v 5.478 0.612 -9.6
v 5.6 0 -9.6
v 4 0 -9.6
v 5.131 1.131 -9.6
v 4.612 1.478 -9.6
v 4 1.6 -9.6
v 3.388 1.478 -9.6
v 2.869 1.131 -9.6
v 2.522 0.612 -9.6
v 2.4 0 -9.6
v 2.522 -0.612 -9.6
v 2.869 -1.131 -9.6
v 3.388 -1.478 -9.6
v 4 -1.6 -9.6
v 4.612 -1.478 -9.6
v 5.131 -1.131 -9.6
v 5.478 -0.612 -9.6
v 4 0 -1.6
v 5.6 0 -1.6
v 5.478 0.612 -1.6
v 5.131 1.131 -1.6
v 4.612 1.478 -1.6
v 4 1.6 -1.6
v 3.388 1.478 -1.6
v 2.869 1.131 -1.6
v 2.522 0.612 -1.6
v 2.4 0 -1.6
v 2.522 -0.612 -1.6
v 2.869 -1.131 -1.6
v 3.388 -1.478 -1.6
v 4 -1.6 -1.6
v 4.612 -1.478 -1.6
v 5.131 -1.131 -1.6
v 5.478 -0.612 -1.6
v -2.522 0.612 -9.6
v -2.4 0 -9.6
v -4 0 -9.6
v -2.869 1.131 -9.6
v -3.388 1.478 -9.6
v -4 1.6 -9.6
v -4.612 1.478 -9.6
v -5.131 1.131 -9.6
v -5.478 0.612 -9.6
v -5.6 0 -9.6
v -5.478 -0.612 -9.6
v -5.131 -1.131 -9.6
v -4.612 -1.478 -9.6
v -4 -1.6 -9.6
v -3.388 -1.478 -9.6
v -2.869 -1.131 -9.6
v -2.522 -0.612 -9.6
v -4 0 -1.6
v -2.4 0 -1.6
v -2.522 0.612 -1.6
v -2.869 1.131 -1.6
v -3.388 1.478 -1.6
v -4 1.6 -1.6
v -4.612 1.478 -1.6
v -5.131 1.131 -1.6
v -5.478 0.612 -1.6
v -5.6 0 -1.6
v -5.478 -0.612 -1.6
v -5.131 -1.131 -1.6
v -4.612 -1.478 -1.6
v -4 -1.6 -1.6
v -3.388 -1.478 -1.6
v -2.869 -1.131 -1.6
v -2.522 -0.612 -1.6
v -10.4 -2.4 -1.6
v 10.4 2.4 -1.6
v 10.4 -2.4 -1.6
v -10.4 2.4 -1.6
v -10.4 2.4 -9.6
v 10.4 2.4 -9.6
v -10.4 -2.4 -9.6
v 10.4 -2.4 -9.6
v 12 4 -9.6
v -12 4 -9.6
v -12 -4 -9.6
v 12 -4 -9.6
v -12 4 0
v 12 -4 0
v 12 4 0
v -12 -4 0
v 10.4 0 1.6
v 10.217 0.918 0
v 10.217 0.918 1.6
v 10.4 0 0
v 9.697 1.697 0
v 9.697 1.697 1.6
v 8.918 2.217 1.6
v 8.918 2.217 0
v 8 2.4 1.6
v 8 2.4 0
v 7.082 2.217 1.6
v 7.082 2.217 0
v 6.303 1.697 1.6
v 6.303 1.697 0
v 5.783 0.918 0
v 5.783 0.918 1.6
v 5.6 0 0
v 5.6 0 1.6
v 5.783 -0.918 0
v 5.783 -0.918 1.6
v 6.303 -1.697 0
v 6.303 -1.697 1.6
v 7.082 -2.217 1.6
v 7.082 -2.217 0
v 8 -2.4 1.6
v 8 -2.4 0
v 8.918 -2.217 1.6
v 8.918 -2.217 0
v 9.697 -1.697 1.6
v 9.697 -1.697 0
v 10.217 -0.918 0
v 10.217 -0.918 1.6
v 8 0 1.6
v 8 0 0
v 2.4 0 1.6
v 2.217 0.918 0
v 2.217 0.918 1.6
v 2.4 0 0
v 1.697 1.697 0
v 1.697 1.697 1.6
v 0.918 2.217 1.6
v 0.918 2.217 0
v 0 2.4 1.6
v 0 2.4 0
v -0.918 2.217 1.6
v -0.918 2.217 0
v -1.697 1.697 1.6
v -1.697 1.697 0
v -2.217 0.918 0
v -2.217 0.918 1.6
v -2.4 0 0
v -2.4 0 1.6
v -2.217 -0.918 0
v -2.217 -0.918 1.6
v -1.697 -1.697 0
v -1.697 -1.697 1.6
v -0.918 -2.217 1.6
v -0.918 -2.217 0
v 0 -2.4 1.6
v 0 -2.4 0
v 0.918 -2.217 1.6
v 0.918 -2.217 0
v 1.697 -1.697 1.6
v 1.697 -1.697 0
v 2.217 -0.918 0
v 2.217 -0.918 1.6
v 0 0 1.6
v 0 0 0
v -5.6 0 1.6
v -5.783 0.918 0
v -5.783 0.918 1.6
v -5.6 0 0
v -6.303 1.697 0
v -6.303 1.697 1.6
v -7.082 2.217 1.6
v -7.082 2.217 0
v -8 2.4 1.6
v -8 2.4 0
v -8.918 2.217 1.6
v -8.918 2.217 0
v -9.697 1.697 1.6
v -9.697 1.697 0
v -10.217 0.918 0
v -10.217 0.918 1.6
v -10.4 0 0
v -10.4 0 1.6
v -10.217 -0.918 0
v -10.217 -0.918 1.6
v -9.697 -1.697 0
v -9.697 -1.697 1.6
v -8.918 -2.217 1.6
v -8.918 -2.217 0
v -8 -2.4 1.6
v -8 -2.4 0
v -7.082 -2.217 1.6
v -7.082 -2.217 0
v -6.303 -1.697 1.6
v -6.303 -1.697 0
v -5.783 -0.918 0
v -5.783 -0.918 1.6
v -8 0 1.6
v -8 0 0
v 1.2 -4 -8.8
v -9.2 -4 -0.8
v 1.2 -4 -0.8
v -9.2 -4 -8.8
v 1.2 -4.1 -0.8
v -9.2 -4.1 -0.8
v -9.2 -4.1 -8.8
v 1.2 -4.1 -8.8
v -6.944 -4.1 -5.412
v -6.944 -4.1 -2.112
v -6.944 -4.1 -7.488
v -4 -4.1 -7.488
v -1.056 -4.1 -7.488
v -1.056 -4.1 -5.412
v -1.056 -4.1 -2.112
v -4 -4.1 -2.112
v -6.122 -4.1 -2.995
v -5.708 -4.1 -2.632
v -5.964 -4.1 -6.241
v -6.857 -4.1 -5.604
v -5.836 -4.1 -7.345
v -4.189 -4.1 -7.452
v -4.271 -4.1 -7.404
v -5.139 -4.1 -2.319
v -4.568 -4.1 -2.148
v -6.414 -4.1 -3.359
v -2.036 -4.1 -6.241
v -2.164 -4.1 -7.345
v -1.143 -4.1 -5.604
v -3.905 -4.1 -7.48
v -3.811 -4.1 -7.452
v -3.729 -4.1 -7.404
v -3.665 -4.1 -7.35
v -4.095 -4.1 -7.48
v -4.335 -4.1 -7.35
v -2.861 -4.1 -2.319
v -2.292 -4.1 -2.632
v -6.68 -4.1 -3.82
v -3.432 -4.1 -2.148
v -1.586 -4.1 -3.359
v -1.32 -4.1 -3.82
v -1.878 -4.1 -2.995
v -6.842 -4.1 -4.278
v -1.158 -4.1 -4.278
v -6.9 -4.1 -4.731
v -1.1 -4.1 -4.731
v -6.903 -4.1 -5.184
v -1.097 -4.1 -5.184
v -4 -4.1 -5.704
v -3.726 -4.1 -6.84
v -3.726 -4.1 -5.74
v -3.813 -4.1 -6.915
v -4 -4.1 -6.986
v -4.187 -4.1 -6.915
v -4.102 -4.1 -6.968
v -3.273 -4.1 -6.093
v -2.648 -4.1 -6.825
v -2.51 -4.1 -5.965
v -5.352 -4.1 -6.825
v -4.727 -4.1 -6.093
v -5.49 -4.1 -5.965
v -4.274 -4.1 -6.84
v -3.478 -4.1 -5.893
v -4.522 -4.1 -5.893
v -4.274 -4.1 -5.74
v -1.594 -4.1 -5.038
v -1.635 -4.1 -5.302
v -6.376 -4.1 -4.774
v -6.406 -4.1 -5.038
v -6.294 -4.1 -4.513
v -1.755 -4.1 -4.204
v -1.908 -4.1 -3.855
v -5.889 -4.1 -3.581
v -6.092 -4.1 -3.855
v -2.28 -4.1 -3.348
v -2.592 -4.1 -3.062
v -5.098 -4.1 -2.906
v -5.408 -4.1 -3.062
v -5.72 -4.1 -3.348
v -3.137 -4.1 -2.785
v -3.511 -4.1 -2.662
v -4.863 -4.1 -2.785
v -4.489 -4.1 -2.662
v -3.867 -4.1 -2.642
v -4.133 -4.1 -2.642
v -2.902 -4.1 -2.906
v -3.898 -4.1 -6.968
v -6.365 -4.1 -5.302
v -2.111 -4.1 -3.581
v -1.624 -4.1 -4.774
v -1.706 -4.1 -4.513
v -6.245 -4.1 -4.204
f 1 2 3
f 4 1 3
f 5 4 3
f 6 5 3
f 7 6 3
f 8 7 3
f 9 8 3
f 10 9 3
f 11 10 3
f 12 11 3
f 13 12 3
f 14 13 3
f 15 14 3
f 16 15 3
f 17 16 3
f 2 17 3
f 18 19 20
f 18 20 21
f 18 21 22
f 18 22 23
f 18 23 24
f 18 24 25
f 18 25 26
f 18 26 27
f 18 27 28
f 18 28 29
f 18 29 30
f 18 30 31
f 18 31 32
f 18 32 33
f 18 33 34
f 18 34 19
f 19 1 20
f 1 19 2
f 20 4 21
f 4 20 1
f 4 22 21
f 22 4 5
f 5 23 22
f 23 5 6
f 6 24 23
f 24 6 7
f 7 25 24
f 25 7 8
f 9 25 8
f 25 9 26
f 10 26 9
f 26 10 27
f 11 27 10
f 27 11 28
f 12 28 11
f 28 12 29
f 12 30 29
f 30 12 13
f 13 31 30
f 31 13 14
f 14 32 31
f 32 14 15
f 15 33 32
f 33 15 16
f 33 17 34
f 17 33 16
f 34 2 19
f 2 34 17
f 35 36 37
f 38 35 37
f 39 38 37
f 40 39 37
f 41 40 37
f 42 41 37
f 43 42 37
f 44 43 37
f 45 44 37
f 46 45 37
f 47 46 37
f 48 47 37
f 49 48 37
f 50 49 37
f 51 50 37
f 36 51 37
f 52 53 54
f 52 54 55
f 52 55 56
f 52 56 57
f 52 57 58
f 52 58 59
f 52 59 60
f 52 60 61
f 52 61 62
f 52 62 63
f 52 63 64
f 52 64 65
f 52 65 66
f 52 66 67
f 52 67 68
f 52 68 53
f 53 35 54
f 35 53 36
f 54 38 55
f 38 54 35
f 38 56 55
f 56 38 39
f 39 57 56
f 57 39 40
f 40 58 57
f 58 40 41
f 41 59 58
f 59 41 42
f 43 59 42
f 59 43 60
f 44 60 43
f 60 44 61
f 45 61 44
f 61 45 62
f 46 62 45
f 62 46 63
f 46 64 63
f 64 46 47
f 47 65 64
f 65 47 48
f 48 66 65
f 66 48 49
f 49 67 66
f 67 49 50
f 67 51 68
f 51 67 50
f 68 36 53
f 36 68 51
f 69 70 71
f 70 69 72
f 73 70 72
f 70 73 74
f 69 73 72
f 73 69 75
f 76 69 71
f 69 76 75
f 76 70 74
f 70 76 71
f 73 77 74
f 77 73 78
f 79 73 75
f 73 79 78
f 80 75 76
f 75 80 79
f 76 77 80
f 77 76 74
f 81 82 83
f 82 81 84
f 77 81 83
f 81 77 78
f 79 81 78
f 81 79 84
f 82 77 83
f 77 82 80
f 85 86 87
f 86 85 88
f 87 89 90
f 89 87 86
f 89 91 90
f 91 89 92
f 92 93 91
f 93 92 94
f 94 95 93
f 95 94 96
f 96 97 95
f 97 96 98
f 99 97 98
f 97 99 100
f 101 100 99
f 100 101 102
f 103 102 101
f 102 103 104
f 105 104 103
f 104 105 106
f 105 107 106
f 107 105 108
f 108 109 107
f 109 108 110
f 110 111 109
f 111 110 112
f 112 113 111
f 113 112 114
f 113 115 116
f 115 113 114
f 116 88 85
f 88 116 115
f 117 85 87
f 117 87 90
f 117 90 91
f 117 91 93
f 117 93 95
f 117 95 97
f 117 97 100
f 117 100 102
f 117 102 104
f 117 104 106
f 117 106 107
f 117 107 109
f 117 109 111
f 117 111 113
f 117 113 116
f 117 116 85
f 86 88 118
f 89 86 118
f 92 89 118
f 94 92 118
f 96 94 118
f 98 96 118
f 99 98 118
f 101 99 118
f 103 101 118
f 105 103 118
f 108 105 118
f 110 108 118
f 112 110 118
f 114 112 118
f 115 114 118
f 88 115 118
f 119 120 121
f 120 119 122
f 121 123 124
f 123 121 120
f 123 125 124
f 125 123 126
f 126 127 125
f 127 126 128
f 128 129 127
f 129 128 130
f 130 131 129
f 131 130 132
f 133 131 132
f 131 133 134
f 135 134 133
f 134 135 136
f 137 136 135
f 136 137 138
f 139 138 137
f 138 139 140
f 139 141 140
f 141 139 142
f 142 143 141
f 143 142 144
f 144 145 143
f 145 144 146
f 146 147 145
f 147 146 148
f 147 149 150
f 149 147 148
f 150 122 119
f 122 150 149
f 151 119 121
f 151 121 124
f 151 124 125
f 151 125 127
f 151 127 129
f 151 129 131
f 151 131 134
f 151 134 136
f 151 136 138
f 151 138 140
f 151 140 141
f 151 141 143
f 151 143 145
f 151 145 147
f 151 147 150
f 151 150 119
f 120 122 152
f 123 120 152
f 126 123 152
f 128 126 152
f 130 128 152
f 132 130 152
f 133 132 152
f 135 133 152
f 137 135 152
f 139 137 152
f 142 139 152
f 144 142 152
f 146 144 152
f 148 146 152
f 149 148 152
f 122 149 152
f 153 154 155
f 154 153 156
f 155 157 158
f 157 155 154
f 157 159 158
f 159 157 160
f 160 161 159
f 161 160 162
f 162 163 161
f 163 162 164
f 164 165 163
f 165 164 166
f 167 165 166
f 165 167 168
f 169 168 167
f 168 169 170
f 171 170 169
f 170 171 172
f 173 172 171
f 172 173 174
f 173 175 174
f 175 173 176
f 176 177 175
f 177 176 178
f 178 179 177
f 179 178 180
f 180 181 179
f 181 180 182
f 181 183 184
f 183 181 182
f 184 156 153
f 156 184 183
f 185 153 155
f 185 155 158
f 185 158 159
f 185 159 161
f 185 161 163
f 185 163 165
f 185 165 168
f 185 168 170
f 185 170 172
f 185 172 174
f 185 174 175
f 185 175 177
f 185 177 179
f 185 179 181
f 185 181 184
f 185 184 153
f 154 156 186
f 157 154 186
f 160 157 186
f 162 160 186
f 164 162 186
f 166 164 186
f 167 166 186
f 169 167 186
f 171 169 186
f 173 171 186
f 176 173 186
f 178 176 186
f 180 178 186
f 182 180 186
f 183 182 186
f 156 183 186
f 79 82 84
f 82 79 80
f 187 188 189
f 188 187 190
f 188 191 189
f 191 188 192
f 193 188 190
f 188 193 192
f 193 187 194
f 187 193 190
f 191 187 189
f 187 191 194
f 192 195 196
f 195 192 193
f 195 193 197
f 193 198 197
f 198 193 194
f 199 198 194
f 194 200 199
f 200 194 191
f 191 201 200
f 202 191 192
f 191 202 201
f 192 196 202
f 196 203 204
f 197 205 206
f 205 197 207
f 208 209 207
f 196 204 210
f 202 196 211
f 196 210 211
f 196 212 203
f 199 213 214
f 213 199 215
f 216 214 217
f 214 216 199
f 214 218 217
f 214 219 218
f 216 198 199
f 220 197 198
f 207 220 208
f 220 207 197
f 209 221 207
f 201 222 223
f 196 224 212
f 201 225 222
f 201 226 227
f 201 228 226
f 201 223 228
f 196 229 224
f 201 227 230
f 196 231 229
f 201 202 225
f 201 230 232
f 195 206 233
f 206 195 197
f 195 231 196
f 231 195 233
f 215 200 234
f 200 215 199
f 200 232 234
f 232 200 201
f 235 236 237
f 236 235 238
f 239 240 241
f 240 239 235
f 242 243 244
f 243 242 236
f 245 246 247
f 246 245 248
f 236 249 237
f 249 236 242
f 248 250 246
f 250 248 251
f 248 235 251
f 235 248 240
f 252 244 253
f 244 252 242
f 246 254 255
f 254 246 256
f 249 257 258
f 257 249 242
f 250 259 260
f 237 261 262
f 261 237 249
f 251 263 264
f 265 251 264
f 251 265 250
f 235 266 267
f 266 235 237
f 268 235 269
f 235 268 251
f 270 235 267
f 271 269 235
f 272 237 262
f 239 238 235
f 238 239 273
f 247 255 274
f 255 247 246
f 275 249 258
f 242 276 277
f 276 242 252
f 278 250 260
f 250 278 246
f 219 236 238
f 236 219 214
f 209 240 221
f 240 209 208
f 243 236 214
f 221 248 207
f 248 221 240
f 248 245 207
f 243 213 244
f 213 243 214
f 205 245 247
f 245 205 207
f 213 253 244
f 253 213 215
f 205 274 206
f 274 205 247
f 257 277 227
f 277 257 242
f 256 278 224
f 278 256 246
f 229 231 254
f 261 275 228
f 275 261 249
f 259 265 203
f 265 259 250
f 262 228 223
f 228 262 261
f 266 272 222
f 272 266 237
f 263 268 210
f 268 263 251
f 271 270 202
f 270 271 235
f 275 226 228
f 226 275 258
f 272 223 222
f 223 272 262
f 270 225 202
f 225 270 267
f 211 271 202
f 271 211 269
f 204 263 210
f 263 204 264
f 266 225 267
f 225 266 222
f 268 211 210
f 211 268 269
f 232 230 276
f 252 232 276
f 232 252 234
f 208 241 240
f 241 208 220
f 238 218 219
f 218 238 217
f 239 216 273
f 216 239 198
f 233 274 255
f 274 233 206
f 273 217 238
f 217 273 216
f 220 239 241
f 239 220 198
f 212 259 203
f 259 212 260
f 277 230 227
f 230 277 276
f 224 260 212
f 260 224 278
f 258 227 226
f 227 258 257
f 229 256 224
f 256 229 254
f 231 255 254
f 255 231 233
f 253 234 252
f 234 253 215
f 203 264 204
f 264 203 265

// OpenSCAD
// file: ../p/4-4edge.scad
use <../lib.scad>
function ldraw_lib__4_4edge() = [
// 0 Circle 1.0
// 0 Name: 4-4edge.dat
// 0 Author: James Jessiman
// 0 !LDRAW_ORG Primitive UPDATE 2017-01
// 0 !LICENSE Licensed under CC BY 2.0 and CC BY 4.0 : see CAreadme.txt
// 
// 0 BFC CERTIFY CCW
  [0,"BFC","CERTIFY"],
  [0,"BFC","CCW"],
// 
// 0 !HISTORY 1998-12-15 [PTadmin] Official Update 1998-10
// 0 !HISTORY 2005-12-28 [PTadmin] Official Update 2005-01
// 0 !HISTORY 2007-06-24 [PTadmin] Header formatted for Contributor Agreement
// 0 !HISTORY 2008-07-01 [PTadmin] Official Update 2008-01
// 0 !HISTORY 2017-01-15 [Steffen] BFCed
// 0 !HISTORY 2017-12-30 [PTadmin] Official Update 2017-01
// 
// 
// 2 24 1 0 0 0.9239 0 0.3827
  [2,24,1,0,0,0.9239,0,0.3827],
// 2 24 0.9239 0 0.3827 0.7071 0 0.7071
  [2,24,0.9239,0,0.3827,0.7071,0,0.7071],
// 2 24 0.7071 0 0.7071 0.3827 0 0.9239
  [2,24,0.7071,0,0.7071,0.3827,0,0.9239],
// 2 24 0.3827 0 0.9239 0 0 1
  [2,24,0.3827,0,0.9239,0,0,1],
// 2 24 0 0 1 -0.3827 0 0.9239
  [2,24,0,0,1,-0.3827,0,0.9239],
// 2 24 -0.3827 0 0.9239 -0.7071 0 0.7071
  [2,24,-0.3827,0,0.9239,-0.7071,0,0.7071],
// 2 24 -0.7071 0 0.7071 -0.9239 0 0.3827
  [2,24,-0.7071,0,0.7071,-0.9239,0,0.3827],
// 2 24 -0.9239 0 0.3827 -1 0 -0
  [2,24,-0.9239,0,0.3827,-1,0,-0],
// 2 24 -1 0 -0 -0.9239 0 -0.3827
  [2,24,-1,0,-0,-0.9239,0,-0.3827],
// 2 24 -0.9239 0 -0.3827 -0.7071 0 -0.7071
  [2,24,-0.9239,0,-0.3827,-0.7071,0,-0.7071],
// 2 24 -0.7071 0 -0.7071 -0.3827 0 -0.9239
  [2,24,-0.7071,0,-0.7071,-0.3827,0,-0.9239],
// 2 24 -0.3827 0 -0.9239 0 0 -1
  [2,24,-0.3827,0,-0.9239,0,0,-1],
// 2 24 0 0 -1 0.3827 0 -0.9239
  [2,24,0,0,-1,0.3827,0,-0.9239],
// 2 24 0.3827 0 -0.9239 0.7071 0 -0.7071
  [2,24,0.3827,0,-0.9239,0.7071,0,-0.7071],
// 2 24 0.7071 0 -0.7071 0.9239 0 -0.3827
  [2,24,0.7071,0,-0.7071,0.9239,0,-0.3827],
// 2 24 0.9239 0 -0.3827 1 0 0
  [2,24,0.9239,0,-0.3827,1,0,0],
];
module ldraw_lib__4_4edge(step=0, col=false, unit=2/5, alt=false, line=0.2, solid=!$preview)
    makepoly(ldraw_lib__4_4edge(), step=step, col=col, unit=unit, alt=alt, line=line, solid=solid);
ldraw_lib__4_4edge(line=0.2);
// file: ../p/4-4disc.scad
use <../lib.scad>
function ldraw_lib__4_4disc() = [
// 0 Disc 1.0
// 0 Name: 4-4disc.dat
// 0 Author: James Jessiman
// 0 !LDRAW_ORG Primitive UPDATE 2002-02
// 0 !LICENSE Licensed under CC BY 2.0 and CC BY 4.0 : see CAreadme.txt
// 
// 0 BFC CERTIFY CCW
  [0,"BFC","CERTIFY"],
  [0,"BFC","CCW"],
// 
// 0 !HISTORY 1998-12-15 [PTadmin] Official Update 1998-10
// 0 !HISTORY 2002-03-23 [sbliss] Added BFC statement
// 0 !HISTORY 2002-04-25 [PTadmin] Official Update 2002-02
// 0 !HISTORY 2007-06-24 [PTadmin] Header formatted for Contributor Agreement
// 0 !HISTORY 2008-07-01 [PTadmin] Official Update 2008-01
// 
// 
// 3 16 0 0 0 1 0 0 0.9239 0 0.3827
  [3,16,0,0,0,1,0,0,0.9239,0,0.3827],
// 3 16 0 0 0 0.9239 0 0.3827 0.7071 0 0.7071
  [3,16,0,0,0,0.9239,0,0.3827,0.7071,0,0.7071],
// 3 16 0 0 0 0.7071 0 0.7071 0.3827 0 0.9239
  [3,16,0,0,0,0.7071,0,0.7071,0.3827,0,0.9239],
// 3 16 0 0 0 0.3827 0 0.9239 0 0 1
  [3,16,0,0,0,0.3827,0,0.9239,0,0,1],
// 3 16 0 0 0 0 0 1 -0.3827 0 0.9239
  [3,16,0,0,0,0,0,1,-0.3827,0,0.9239],
// 3 16 0 0 0 -0.3827 0 0.9239 -0.7071 0 0.7071
  [3,16,0,0,0,-0.3827,0,0.9239,-0.7071,0,0.7071],
// 3 16 0 0 0 -0.7071 0 0.7071 -0.9239 0 0.3827
  [3,16,0,0,0,-0.7071,0,0.7071,-0.9239,0,0.3827],
// 3 16 0 0 0 -0.9239 0 0.3827 -1 0 -0
  [3,16,0,0,0,-0.9239,0,0.3827,-1,0,-0],
// 3 16 0 0 0 -1 0 -0 -0.9239 0 -0.3827
  [3,16,0,0,0,-1,0,-0,-0.9239,0,-0.3827],
// 3 16 0 0 0 -0.9239 0 -0.3827 -0.7071 0 -0.7071
  [3,16,0,0,0,-0.9239,0,-0.3827,-0.7071,0,-0.7071],
// 3 16 0 0 0 -0.7071 0 -0.7071 -0.3827 0 -0.9239
  [3,16,0,0,0,-0.7071,0,-0.7071,-0.3827,0,-0.9239],
// 3 16 0 0 0 -0.3827 0 -0.9239 0 0 -1
  [3,16,0,0,0,-0.3827,0,-0.9239,0,0,-1],
// 3 16 0 0 0 0 0 -1 0.3827 0 -0.9239
  [3,16,0,0,0,0,0,-1,0.3827,0,-0.9239],
// 3 16 0 0 0 0.3827 0 -0.9239 0.7071 0 -0.7071
  [3,16,0,0,0,0.3827,0,-0.9239,0.7071,0,-0.7071],
// 3 16 0 0 0 0.7071 0 -0.7071 0.9239 0 -0.3827
  [3,16,0,0,0,0.7071,0,-0.7071,0.9239,0,-0.3827],
// 3 16 0 0 0 0.9239 0 -0.3827 1 0 0
  [3,16,0,0,0,0.9239,0,-0.3827,1,0,0],
// 0
];
module ldraw_lib__4_4disc(step=0, col=false, unit=2/5, alt=false, line=0.2, solid=!$preview)
    makepoly(ldraw_lib__4_4disc(), step=step, col=col, unit=unit, alt=alt, line=line, solid=solid);
ldraw_lib__4_4disc(line=0.2);
// file: ../p/4-4cyli.scad
use <../lib.scad>
$fa=1; $fs=0.2;
function ldraw_lib__4_4cyli(realsolid=false) = [
// 0 Cylinder 1.0
// 0 Name: 4-4cyli.dat
// 0 Author: James Jessiman
// 0 !LDRAW_ORG Primitive UPDATE 2005-01
// 0 !LICENSE Licensed under CC BY 2.0 and CC BY 4.0 : see CAreadme.txt
// 
// 0 BFC CERTIFY CCW
  [0,"BFC","CERTIFY"],
  [0,"BFC","CCW"],
// 
// 0 !HISTORY 1998-12-15 [PTadmin] Official Update 1998-10
// 0 !HISTORY 2002-03-23 [sbliss] Added BFC statement; merged headers from files in distributions LDraw 0.27 and Complete.
// 0 !HISTORY 2002-04-25 [PTadmin] Official Update 2002-02
// 0 !HISTORY 2004-12-14 [guyvivan] BFC CCW
// 0 !HISTORY 2005-12-28 [PTadmin] Official Update 2005-01
// 0 !HISTORY 2007-06-24 [PTadmin] Header formatted for Contributor Agreement
// 0 !HISTORY 2008-07-01 [PTadmin] Official Update 2008-01
// 
// 
// 4 16 1 1 0 0.9239 1 0.3827 0.9239 0 0.3827 1 0 0
  [4,16,1,1,0,0.9239,1,0.3827,0.9239,0,0.3827,1,0,0],
// 5 24 1 0 0 1 1 0 0.9239 0 0.3827 0.9239 0 -0.3827
  [5,24,1,0,0,1,1,0,0.9239,0,0.3827,0.9239,0,-0.3827],
// 4 16 0.9239 1 0.3827 0.7071 1 0.7071 0.7071 0 0.7071 0.9239 0 0.3827
  [4,16,0.9239,1,0.3827,0.7071,1,0.7071,0.7071,0,0.7071,0.9239,0,0.3827],
// 5 24 0.9239 0 0.3827 0.9239 1 0.3827 0.7071 0 0.7071 1 0 0
  [5,24,0.9239,0,0.3827,0.9239,1,0.3827,0.7071,0,0.7071,1,0,0],
// 4 16 0.7071 1 0.7071 0.3827 1 0.9239 0.3827 0 0.9239 0.7071 0 0.7071
  [4,16,0.7071,1,0.7071,0.3827,1,0.9239,0.3827,0,0.9239,0.7071,0,0.7071],
// 5 24 0.7071 0 0.7071 0.7071 1 0.7071 0.3827 0 0.9239 0.9239 0 0.3827
  [5,24,0.7071,0,0.7071,0.7071,1,0.7071,0.3827,0,0.9239,0.9239,0,0.3827],
// 4 16 0.3827 1 0.9239 0 1 1 0 0 1 0.3827 0 0.9239
  [4,16,0.3827,1,0.9239,0,1,1,0,0,1,0.3827,0,0.9239],
// 5 24 0.3827 0 0.9239 0.3827 1 0.9239 0 0 1 0.7071 0 0.7071
  [5,24,0.3827,0,0.9239,0.3827,1,0.9239,0,0,1,0.7071,0,0.7071],
// 4 16 0 1 1 -0.3827 1 0.9239 -0.3827 0 0.9239 0 0 1
  [4,16,0,1,1,-0.3827,1,0.9239,-0.3827,0,0.9239,0,0,1],
// 5 24 0 0 1 0 1 1 -0.3827 0 0.9239 0.3827 0 0.9239
  [5,24,0,0,1,0,1,1,-0.3827,0,0.9239,0.3827,0,0.9239],
// 4 16 -0.3827 1 0.9239 -0.7071 1 0.7071 -0.7071 0 0.7071 -0.3827 0 0.9239
  [4,16,-0.3827,1,0.9239,-0.7071,1,0.7071,-0.7071,0,0.7071,-0.3827,0,0.9239],
// 5 24 -0.3827 0 0.9239 -0.3827 1 0.9239 -0.7071 0 0.7071 0 0 1
  [5,24,-0.3827,0,0.9239,-0.3827,1,0.9239,-0.7071,0,0.7071,0,0,1],
// 4 16 -0.7071 1 0.7071 -0.9239 1 0.3827 -0.9239 0 0.3827 -0.7071 0 0.7071
  [4,16,-0.7071,1,0.7071,-0.9239,1,0.3827,-0.9239,0,0.3827,-0.7071,0,0.7071],
// 5 24 -0.7071 0 0.7071 -0.7071 1 0.7071 -0.9239 0 0.3827 -0.3827 0 0.9239
  [5,24,-0.7071,0,0.7071,-0.7071,1,0.7071,-0.9239,0,0.3827,-0.3827,0,0.9239],
// 4 16 -0.9239 1 0.3827 -1 1 0 -1 0 0 -0.9239 0 0.3827
  [4,16,-0.9239,1,0.3827,-1,1,0,-1,0,0,-0.9239,0,0.3827],
// 5 24 -0.9239 0 0.3827 -0.9239 1 0.3827 -1 0 0 -0.7071 0 0.7071
  [5,24,-0.9239,0,0.3827,-0.9239,1,0.3827,-1,0,0,-0.7071,0,0.7071],
// 4 16 -1 1 0 -0.9239 1 -0.3827 -0.9239 0 -0.3827 -1 0 0
  [4,16,-1,1,0,-0.9239,1,-0.3827,-0.9239,0,-0.3827,-1,0,0],
// 5 24 -1 0 0 -1 1 0 -0.9239 0 -0.3827 -0.9239 0 0.3827
  [5,24,-1,0,0,-1,1,0,-0.9239,0,-0.3827,-0.9239,0,0.3827],
// 4 16 -0.9239 1 -0.3827 -0.7071 1 -0.7071 -0.7071 0 -0.7071 -0.9239 0 -0.3827
  [4,16,-0.9239,1,-0.3827,-0.7071,1,-0.7071,-0.7071,0,-0.7071,-0.9239,0,-0.3827],
// 5 24 -0.9239 0 -0.3827 -0.9239 1 -0.3827 -0.7071 0 -0.7071 -1 0 0
  [5,24,-0.9239,0,-0.3827,-0.9239,1,-0.3827,-0.7071,0,-0.7071,-1,0,0],
// 4 16 -0.7071 1 -0.7071 -0.3827 1 -0.9239 -0.3827 0 -0.9239 -0.7071 0 -0.7071
  [4,16,-0.7071,1,-0.7071,-0.3827,1,-0.9239,-0.3827,0,-0.9239,-0.7071,0,-0.7071],
// 5 24 -0.7071 0 -0.7071 -0.7071 1 -0.7071 -0.3827 0 -0.9239 -0.9239 0 -0.3827
  [5,24,-0.7071,0,-0.7071,-0.7071,1,-0.7071,-0.3827,0,-0.9239,-0.9239,0,-0.3827],
// 4 16 -0.3827 1 -0.9239 0 1 -1 0 0 -1 -0.3827 0 -0.9239
  [4,16,-0.3827,1,-0.9239,0,1,-1,0,0,-1,-0.3827,0,-0.9239],
// 5 24 -0.3827 0 -0.9239 -0.3827 1 -0.9239 0 0 -1 -0.7071 0 -0.7071
  [5,24,-0.3827,0,-0.9239,-0.3827,1,-0.9239,0,0,-1,-0.7071,0,-0.7071],
// 4 16 0 1 -1 0.3827 1 -0.9239 0.3827 0 -0.9239 0 0 -1
  [4,16,0,1,-1,0.3827,1,-0.9239,0.3827,0,-0.9239,0,0,-1],
// 5 24 0 0 -1 0 1 -1 0.3827 0 -0.9239 -0.3827 0 -0.9239
  [5,24,0,0,-1,0,1,-1,0.3827,0,-0.9239,-0.3827,0,-0.9239],
// 4 16 0.3827 1 -0.9239 0.7071 1 -0.7071 0.7071 0 -0.7071 0.3827 0 -0.9239
  [4,16,0.3827,1,-0.9239,0.7071,1,-0.7071,0.7071,0,-0.7071,0.3827,0,-0.9239],
// 5 24 0.3827 0 -0.9239 0.3827 1 -0.9239 0.7071 0 -0.7071 0 0 -1
  [5,24,0.3827,0,-0.9239,0.3827,1,-0.9239,0.7071,0,-0.7071,0,0,-1],
// 4 16 0.7071 1 -0.7071 0.9239 1 -0.3827 0.9239 0 -0.3827 0.7071 0 -0.7071
  [4,16,0.7071,1,-0.7071,0.9239,1,-0.3827,0.9239,0,-0.3827,0.7071,0,-0.7071],
// 5 24 0.7071 0 -0.7071 0.7071 1 -0.7071 0.9239 0 -0.3827 0.3827 0 -0.9239
  [5,24,0.7071,0,-0.7071,0.7071,1,-0.7071,0.9239,0,-0.3827,0.3827,0,-0.9239],
// 4 16 0.9239 1 -0.3827 1 1 0 1 0 0 0.9239 0 -0.3827
  [4,16,0.9239,1,-0.3827,1,1,0,1,0,0,0.9239,0,-0.3827],
// 5 24 0.9239 0 -0.3827 0.9239 1 -0.3827 1 0 0 0.7071 0 -0.7071
  [5,24,0.9239,0,-0.3827,0.9239,1,-0.3827,1,0,0,0.7071,0,-0.7071],
// 0
];
module ldraw_lib__4_4cyli(step=0, col=false, unit=2/5, alt=false, line=0.2, solid=!$preview)
    makepoly(ldraw_lib__4_4cyli(solid), step=step, col=col, unit=unit, alt=alt, line=line, solid=solid);
ldraw_lib__4_4cyli(line=0.2);
// file: ../p/stud3.scad
use <../lib.scad>
use <4-4cyli.scad>
use <4-4disc.scad>
use <4-4edge.scad>
function ldraw_lib__stud3() = [
// 0 Stud Tube Solid
// 0 Name: stud3.dat
// 0 Author: James Jessiman
// 0 !LDRAW_ORG Primitive UPDATE 2012-01
// 0 !LICENSE Licensed under CC BY 4.0 : see CAreadme.txt
// 
// 0 BFC CERTIFY CCW
  [0,"BFC","CERTIFY"],
  [0,"BFC","CCW"],
// 
// 0 !HISTORY 2002-04-04 [sbliss] Modified for BFC compliance
// 0 !HISTORY 2002-04-25 [PTadmin] Official Update 2002-02
// 0 !HISTORY 2007-06-24 [PTadmin] Header formatted for Contributor Agreement
// 0 !HISTORY 2008-07-01 [PTadmin] Official Update 2008-01
// 0 !HISTORY 2012-02-16 [Philo] Changed to CCW
// 0 !HISTORY 2012-03-30 [PTadmin] Official Update 2012-01
// 
// 
// 1 16 0 -4 0 4 0 0 0 1 0 0 0 4 4-4edge.dat
  [1,16,0,-4,0,4,0,0,0,1,0,0,0,4, ldraw_lib__4_4edge()],
// 1 16 0 0 0 4 0 0 0 1 0 0 0 4 4-4edge.dat
  [1,16,0,0,0,4,0,0,0,1,0,0,0,4, ldraw_lib__4_4edge()],
// 1 16 0 -4 0 4 0 0 0 1 0 0 0 4 4-4disc.dat
  [1,16,0,-4,0,4,0,0,0,1,0,0,0,4, ldraw_lib__4_4disc()],
  [-1,16,0,0,0,4,0,0,0,-1,0,0,0,4, ldraw_lib__4_4disc()],
// 1 16 0 -4 0 4 0 0 0 4 0 0 0 4 4-4cyli.dat
  [1,16,0,-4,0,4,0,0,0,4,0,0,0,4, ldraw_lib__4_4cyli()],
];
module ldraw_lib__stud3(step=0, col=false, unit=2/5, alt=false, line=0.2, solid=!$preview)
    makepoly(ldraw_lib__stud3(), step=step, col=col, unit=unit, alt=alt, line=line, solid=solid);
ldraw_lib__stud3(line=0.2);
// file: ../p/stud.scad
use <../lib.scad>
use <4-4cyli.scad>
use <4-4disc.scad>
use <4-4edge.scad>
function ldraw_lib__stud() = [
// 0 Stud
// 0 Name: stud.dat
// 0 Author: James Jessiman
// 0 !LDRAW_ORG Primitive UPDATE 2012-01
// 0 !LICENSE Licensed under CC BY 4.0 : see CAreadme.txt
// 
// 0 BFC CERTIFY CCW
  [0,"BFC","CERTIFY"],
  [0,"BFC","CCW"],
// 
// 0 !HISTORY 2002-04-04 [sbliss] Modified for BFC compliance
// 0 !HISTORY 2002-04-25 [PTadmin] Official Update 2002-02
// 0 !HISTORY 2007-06-24 [PTadmin] Header formatted for Contributor Agreement
// 0 !HISTORY 2008-07-01 [PTadmin] Official Update 2008-01
// 0 !HISTORY 2012-02-16 [Philo] Changed to CCW
// 0 !HISTORY 2012-03-30 [PTadmin] Official Update 2012-01
// 
// 
// 1 16 0 0 0 6 0 0 0 1 0 0 0 6 4-4edge.dat
  [1,16,0,0,0,6,0,0,0,1,0,0,0,6, ldraw_lib__4_4edge()],
// 1 16 0 -4 0 6 0 0 0 1 0 0 0 6 4-4edge.dat
  [1,16,0,-4,0,6,0,0,0,1,0,0,0,6, ldraw_lib__4_4edge()],
// 1 16 0 0 0 6 0 0 0 -4 0 0 0 6 4-4cyli.dat
  [1,16,0,0,0,6,0,0,0,-4,0,0,0,6, ldraw_lib__4_4cyli()],
// 1 16 0 -4 0 6 0 0 0 1 0 0 0 6 4-4disc.dat
  [1,16,0,-4,0,6,0,0,0,1,0,0,0,6, ldraw_lib__4_4disc()],
  [-1,16,0,0,0,6,0,0,0,-1,0,0,0,6, ldraw_lib__4_4disc()],
];
module ldraw_lib__stud(step=0, col=false, unit=2/5, alt=false, line=0.2, solid=!$preview)
    makepoly(ldraw_lib__stud(), step=step, col=col, unit=unit, alt=alt, line=line, solid=solid);
ldraw_lib__stud(line=0.2);
// file: ../p/box5.scad
use <../lib.scad>
function ldraw_lib__box5() = [
// 0 Box with 5 Faces and All Edges
// 0 Name: box5.dat
// 0 Author: James Jessiman
// 0 !LDRAW_ORG Primitive UPDATE 2012-01
// 0 !LICENSE Licensed under CC BY 2.0 and CC BY 4.0 : see CAreadme.txt
// 
// 0 BFC CERTIFY CCW
  [0,"BFC","CERTIFY"],
  [0,"BFC","CCW"],
// 
// 0 !HISTORY 2002-04-03 [sbliss] Modified for BFC compliance
// 0 !HISTORY 2002-04-25 [PTadmin] Official Update 2002-02
// 0 !HISTORY 2007-06-24 [PTadmin] Header formatted for Contributor Agreement
// 0 !HISTORY 2008-07-01 [PTadmin] Official Update 2008-01
// 0 !HISTORY 2012-02-16 [Philo] Changed to CCW
// 0 !HISTORY 2012-03-30 [PTadmin] Official Update 2012-01
// 
// 
// 2 24 1 1 1 -1 1 1
  [2,24,1,1,1,-1,1,1],
// 2 24 -1 1 1 -1 1 -1
  [2,24,-1,1,1,-1,1,-1],
// 2 24 -1 1 -1 1 1 -1
  [2,24,-1,1,-1,1,1,-1],
// 2 24 1 1 -1 1 1 1
  [2,24,1,1,-1,1,1,1],
// 2 24 1 0 1 -1 0 1
  [2,24,1,0,1,-1,0,1],
// 2 24 -1 0 1 -1 0 -1
  [2,24,-1,0,1,-1,0,-1],
// 2 24 -1 0 -1 1 0 -1
  [2,24,-1,0,-1,1,0,-1],
// 2 24 1 0 -1 1 0 1
  [2,24,1,0,-1,1,0,1],
// 2 24 1 0 1 1 1 1
  [2,24,1,0,1,1,1,1],
// 2 24 -1 0 1 -1 1 1
  [2,24,-1,0,1,-1,1,1],
// 2 24 1 0 -1 1 1 -1
  [2,24,1,0,-1,1,1,-1],
// 2 24 -1 0 -1 -1 1 -1
  [2,24,-1,0,-1,-1,1,-1],
// 4 16 -1 1 1 1 1 1 1 1 -1 -1 1 -1
  [4,16,-1,1,1,1,1,1,1,1,-1,-1,1,-1],
// 4 16 -1 1 1 -1 0 1 1 0 1 1 1 1
  [4,16,-1,1,1,-1,0,1,1,0,1,1,1,1],
// 4 16 -1 1 -1 -1 0 -1 -1 0 1 -1 1 1
  [4,16,-1,1,-1,-1,0,-1,-1,0,1,-1,1,1],
// 4 16 1 1 -1 1 0 -1 -1 0 -1 -1 1 -1
  [4,16,1,1,-1,1,0,-1,-1,0,-1,-1,1,-1],
// 4 16 1 1 1 1 0 1 1 0 -1 1 1 -1
  [4,16,1,1,1,1,0,1,1,0,-1,1,1,-1],
];
makepoly(ldraw_lib__box5(), line=0.2);
// file: ../p/box4t.scad
use <../lib.scad>
function ldraw_lib__box4t() = [
// 0 Box with 4 Adjacent Faces and All Edges
// 0 Name: box4t.dat
// 0 Author: Tore Eriksson [Tore_Eriksson]
// 0 !LDRAW_ORG Primitive UPDATE 2003-02
// 0 !LICENSE Licensed under CC BY 2.0 and CC BY 4.0 : see CAreadme.txt
// 
// 0 BFC CERTIFY CCW
  [0,"BFC","CERTIFY"],
  [0,"BFC","CCW"],
// 
// 0 !HISTORY 1997-09-29 [PTadmin] Official Update 1997-15
// 0 !HISTORY 2002-08-31 [izanette] Modified with WINDZ for BFC compliance
// 0 !HISTORY 2003-08-01 [PTadmin] Official Update 2003-02
// 0 !HISTORY 2007-06-24 [PTadmin] Header formatted for Contributor Agreement
// 0 !HISTORY 2008-07-01 [PTadmin] Official Update 2008-01
// 
// 
// 2 24 1 1 1 -1 1 1
  [2,24,1,1,1,-1,1,1],
// 2 24 -1 1 1 -1 1 -1
  [2,24,-1,1,1,-1,1,-1],
// 2 24 -1 1 -1 1 1 -1
  [2,24,-1,1,-1,1,1,-1],
// 2 24 1 1 -1 1 1 1
  [2,24,1,1,-1,1,1,1],
// 2 24 1 0 1 -1 0 1
  [2,24,1,0,1,-1,0,1],
// 2 24 -1 0 1 -1 0 -1
  [2,24,-1,0,1,-1,0,-1],
// 2 24 -1 0 -1 1 0 -1
  [2,24,-1,0,-1,1,0,-1],
// 2 24 1 0 -1 1 0 1
  [2,24,1,0,-1,1,0,1],
// 2 24 1 0 1 1 1 1
  [2,24,1,0,1,1,1,1],
// 2 24 -1 0 1 -1 1 1
  [2,24,-1,0,1,-1,1,1],
// 2 24 1 0 -1 1 1 -1
  [2,24,1,0,-1,1,1,-1],
// 2 24 -1 0 -1 -1 1 -1
  [2,24,-1,0,-1,-1,1,-1],
// 4 16 1 1 1 1 1 -1 -1 1 -1 -1 1 1
  [4,16,1,1,1,1,1,-1,-1,1,-1,-1,1,1],
// 4 16 1 1 1 -1 1 1 -1 0 1 1 0 1
  [4,16,1,1,1,-1,1,1,-1,0,1,1,0,1],
// 4 16 -1 1 1 -1 1 -1 -1 0 -1 -1 0 1
  [4,16,-1,1,1,-1,1,-1,-1,0,-1,-1,0,1],
// 0 4 16 -1 1 -1 -1 0 -1 1 0 -1 1 1 -1
// 4 16 1 1 -1 1 1 1 1 0 1 1 0 -1
  [4,16,1,1,-1,1,1,1,1,0,1,1,0,-1],
// 0
];
makepoly(ldraw_lib__box4t(), line=0.2);
// file: s/3622s01.scad
use <../../lib.scad>
use <../../p/box4t.scad>
use <../../p/box5.scad>
use <../../p/stud.scad>
use <../../p/stud3.scad>
function ldraw_lib__s__3622s01() = [
// 0 ~Brick  1 x  3 without Front Face
// 0 Name: s\3622s01.dat
// 0 Author: Andy Westrate [westrate]
// 0 !LDRAW_ORG Subpart UPDATE 2004-02
// 0 !LICENSE Licensed under CC BY 2.0 and CC BY 4.0 : see CAreadme.txt
// 
// 0 BFC CERTIFY CCW
  [0,"BFC","CERTIFY"],
  [0,"BFC","CCW"],
// 
// 0 !HISTORY 2003-10-14 [westrate] Subfiled, BFC'd
// 0 !HISTORY 2004-04-22 [PTadmin] Official Update 2004-02
// 0 !HISTORY 2007-08-31 [PTadmin] Header formatted for Contributor Agreement
// 0 !HISTORY 2008-07-01 [PTadmin] Official Update 2008-01
// 
// 
// 0 // Uncomment the following for front face
// 0 // 4 16 30 0 -10 -30 0 -10 -30 24 -10 30 24 -10
// 1 16 10 4 0 1 0 0 0 -5 0 0 0 1 stud3.dat
  [1,16,10,4,0,1,0,0,0,-5,0,0,0,1, ldraw_lib__stud3()],
// 1 16 -10 4 0 1 0 0 0 -5 0 0 0 1 stud3.dat
  [1,16,-10,4,0,1,0,0,0,-5,0,0,0,1, ldraw_lib__stud3()],
// 
// 0 BFC INVERTNEXT
  [0,"BFC","INVERTNEXT"],
// 1 16 0 24 0 26 0 0 0 -20 0 0 0 6 box5.dat
  [1,16,0,24,0,26,0,0,0,-20,0,0,0,6, ldraw_lib__box5()],
// 
// 4 16 30 24 10 26 24 6 -26 24 6 -30 24 10
  [4,16,30,24,10,26,24,6,-26,24,6,-30,24,10],
// 4 16 -30 24 10 -26 24 6 -26 24 -6 -30 24 -10
  [4,16,-30,24,10,-26,24,6,-26,24,-6,-30,24,-10],
// 4 16 -30 24 -10 -26 24 -6 26 24 -6 30 24 -10
  [4,16,-30,24,-10,-26,24,-6,26,24,-6,30,24,-10],
// 4 16 30 24 -10 26 24 -6 26 24 6 30 24 10
  [4,16,30,24,-10,26,24,-6,26,24,6,30,24,10],
// 
// 1 16 0 24 0 30 0 0 0 -24 0 0 0 10 box4t.dat
  [1,16,0,24,0,30,0,0,0,-24,0,0,0,10, ldraw_lib__box4t()],
// 
// 1 16 20 0 0 1 0 0 0 1 0 0 0 1 stud.dat
  [1,16,20,0,0,1,0,0,0,1,0,0,0,1, ldraw_lib__stud()],
// 1 16 0 0 0 1 0 0 0 1 0 0 0 1 stud.dat
  [1,16,0,0,0,1,0,0,0,1,0,0,0,1, ldraw_lib__stud()],
// 1 16 -20 0 0 1 0 0 0 1 0 0 0 1 stud.dat
  [1,16,-20,0,0,1,0,0,0,1,0,0,0,1, ldraw_lib__stud()],
// 0
];
makepoly(ldraw_lib__s__3622s01(), line=0.2);
// file: ../p/logo-shell-1971-outerbox.scad
use <../lib.scad>
function ldraw_lib__logo_shell_1971_outerbox() = [
// 0 Logo Shell 1971 Outerbox
// 0 Name: logo-shell-1971-outerbox.dat
// 0 Author: Vincent Messenet [Cheenzo]
// 0 !LDRAW_ORG Primitive UPDATE 2023-04
// 0 !LICENSE Licensed under CC BY 4.0 : see CAreadme.txt
// 
// 0 BFC CERTIFY CCW
  [0,"BFC","CERTIFY"],
  [0,"BFC","CCW"],
// 
// 0 !HISTORY 2023-06-28 [Cheenzo] Created based on 3004s60 by J. C. Tchang [tchang]
// 0 !HISTORY 2023-08-25 [OrionP] Official Update 2023-04
// 
// 
// 0 // Shell Logo 1971
// 0 // Size: x = -11.5 to 11.5 y = -10.5 to 10.5 z = 0
// 
// 3 16 -11.5 0 10.5 -8.29 0 7.05 -6.67 0 8.47
  [3,16,-11.5,0,10.5,-8.29,0,7.05,-6.67,0,8.47],
// 4 16 -7.17 0 -9.94 -7.67 0 -5.63 -11.16 0 -3.14 -11.5 0 -10.5
  [4,16,-7.17,0,-9.94,-7.67,0,-5.63,-11.16,0,-3.14,-11.5,0,-10.5],
// 3 16 -.74 0 -10.36 -1.06 0 -10.17 -7.17 0 -9.94
  [3,16,-.74,0,-10.36,-1.06,0,-10.17,-7.17,0,-9.94],
// 3 16 -11.5 0 10.5 -6.67 0 8.47 -4.45 0 9.69
  [3,16,-11.5,0,10.5,-6.67,0,8.47,-4.45,0,9.69],
// 3 16 0 0 10.5 -11.5 0 10.5 -2.22 0 10.36
  [3,16,0,0,10.5,-11.5,0,10.5,-2.22,0,10.36],
// 3 16 -11.5 0 10.5 -4.45 0 9.69 -2.22 0 10.36
  [3,16,-11.5,0,10.5,-4.45,0,9.69,-2.22,0,10.36],
// 3 16 -11.5 0 10.5 -9.43 0 5.63 -8.29 0 7.05
  [3,16,-11.5,0,10.5,-9.43,0,5.63,-8.29,0,7.05],
// 4 16 11.16 0 -3.14 7.67 0 -5.63 7.17 0 -9.94 11.5 0 -10.5
  [4,16,11.16,0,-3.14,7.67,0,-5.63,7.17,0,-9.94,11.5,0,-10.5],
// 4 16 11.5 0 -10.5 7.17 0 -9.94 .74 0 -10.36 .37 0 -10.47
  [4,16,11.5,0,-10.5,7.17,0,-9.94,.74,0,-10.36,.37,0,-10.47],
// 3 16 7.17 0 -9.94 1.06 0 -10.17 .74 0 -10.36
  [3,16,7.17,0,-9.94,1.06,0,-10.17,.74,0,-10.36],
// 3 16 7.17 0 -9.94 1.31 0 -9.96 1.06 0 -10.17
  [3,16,7.17,0,-9.94,1.31,0,-9.96,1.06,0,-10.17],
// 3 16 .37 0 -10.47 0 0 -10.5 11.5 0 -10.5
  [3,16,.37,0,-10.47,0,0,-10.5,11.5,0,-10.5],
// 3 16 -.37 0 -10.47 -11.5 0 -10.5 0 0 -10.5
  [3,16,-.37,0,-10.47,-11.5,0,-10.5,0,0,-10.5],
// 4 16 -.37 0 -10.47 -.74 0 -10.36 -7.17 0 -9.94 -11.5 0 -10.5
  [4,16,-.37,0,-10.47,-.74,0,-10.36,-7.17,0,-9.94,-11.5,0,-10.5],
// 3 16 -1.06 0 -10.17 -1.31 0 -9.96 -7.17 0 -9.94
  [3,16,-1.06,0,-10.17,-1.31,0,-9.96,-7.17,0,-9.94],
// 3 16 11.5 0 10.5 4.45 0 9.69 6.67 0 8.47
  [3,16,11.5,0,10.5,4.45,0,9.69,6.67,0,8.47],
// 3 16 -11.5 0 10.5 -10.47 0 3.83 -9.43 0 5.63
  [3,16,-11.5,0,10.5,-10.47,0,3.83,-9.43,0,5.63],
// 3 16 11.5 0 10.5 2.22 0 10.36 4.45 0 9.69
  [3,16,11.5,0,10.5,2.22,0,10.36,4.45,0,9.69],
// 3 16 11.5 0 10.5 9.43 0 5.63 10.47 0 3.83
  [3,16,11.5,0,10.5,9.43,0,5.63,10.47,0,3.83],
// 3 16 11.5 0 10.5 8.29 0 7.05 9.43 0 5.63
  [3,16,11.5,0,10.5,8.29,0,7.05,9.43,0,5.63],
// 3 16 11.5 0 10.5 6.67 0 8.47 8.29 0 7.05
  [3,16,11.5,0,10.5,6.67,0,8.47,8.29,0,7.05],
// 3 16 -11.5 0 10.5 -11.1 0 2.04 -10.47 0 3.83
  [3,16,-11.5,0,10.5,-11.1,0,2.04,-10.47,0,3.83],
// 3 16 11.5 0 10.5 10.47 0 3.83 11.1 0 2.04
  [3,16,11.5,0,10.5,10.47,0,3.83,11.1,0,2.04],
// 3 16 -11.5 0 10.5 -11.33 0 .27 -11.1 0 2.04
  [3,16,-11.5,0,10.5,-11.33,0,.27,-11.1,0,2.04],
// 3 16 11.5 0 10.5 0 0 10.5 2.22 0 10.36
  [3,16,11.5,0,10.5,0,0,10.5,2.22,0,10.36],
// 3 16 11.5 0 10.5 11.1 0 2.04 11.33 0 .27
  [3,16,11.5,0,10.5,11.1,0,2.04,11.33,0,.27],
// 4 16 -11.16 0 -3.14 -11.34 0 -1.5 -11.5 0 -2.39 -11.5 0 -10.5
  [4,16,-11.16,0,-3.14,-11.34,0,-1.5,-11.5,0,-2.39,-11.5,0,-10.5],
// 4 16 -11.34 0 -1.5 -11.33 0 .27 -11.5 0 10.5 -11.5 0 -2.39
  [4,16,-11.34,0,-1.5,-11.33,0,.27,-11.5,0,10.5,-11.5,0,-2.39],
// 4 16 11.5 0 -2.39 11.34 0 -1.5 11.16 0 -3.14 11.5 0 -10.5
  [4,16,11.5,0,-2.39,11.34,0,-1.5,11.16,0,-3.14,11.5,0,-10.5],
// 4 16 11.5 0 -2.39 11.5 0 10.5 11.33 0 .27 11.34 0 -1.5
  [4,16,11.5,0,-2.39,11.5,0,10.5,11.33,0,.27,11.34,0,-1.5],
];
module ldraw_lib__logo_shell_1971_outerbox(step=0, col=false, unit=2/5, alt=false, line=0.2, solid=!$preview)
    makepoly(ldraw_lib__logo_shell_1971_outerbox(), step=step, col=col, unit=unit, alt=alt, line=line, solid=solid);
ldraw_lib__logo_shell_1971_outerbox(line=0.2);
// file: ../p/box5-12.scad
use <../lib.scad>
function ldraw_lib__box5_12() = [
// 0 Box with 5 Faces without Any Edges
// 0 Name: box5-12.dat
// 0 Author: Chris Dee [cwdee]
// 0 !LDRAW_ORG Primitive UPDATE 2009-02
// 0 !LICENSE Licensed under CC BY 2.0 and CC BY 4.0 : see CAreadme.txt
// 
// 0 BFC CERTIFY CCW
  [0,"BFC","CERTIFY"],
  [0,"BFC","CCW"],
// 
// 0 !HISTORY 2009-09-03 [PTadmin] Official Update 2009-02
// 
// 
// 4 16 1 1 1 1 1 -1 -1 1 -1 -1 1 1
  [4,16,1,1,1,1,1,-1,-1,1,-1,-1,1,1],
// 4 16 -1 0 1 1 0 1 1 1 1 -1 1 1
  [4,16,-1,0,1,1,0,1,1,1,1,-1,1,1],
// 4 16 -1 0 -1 -1 0 1 -1 1 1 -1 1 -1
  [4,16,-1,0,-1,-1,0,1,-1,1,1,-1,1,-1],
// 4 16 1 0 -1 -1 0 -1 -1 1 -1 1 1 -1
  [4,16,1,0,-1,-1,0,-1,-1,1,-1,1,1,-1],
// 4 16 1 0 1 1 0 -1 1 1 -1 1 1 1
  [4,16,1,0,1,1,0,-1,1,1,-1,1,1,1],
// 0
];
module ldraw_lib__box5_12(step=0, col=false, unit=2/5, alt=false, line=0.2, solid=!$preview)
    makepoly(ldraw_lib__box5_12(), step=step, col=col, unit=unit, alt=alt, line=line, solid=solid);
ldraw_lib__box5_12(line=0.2);
// file: 3622.scad
use <../lib.scad>
use <s/3622s01.scad>
function ldraw_lib__3622() = [
// 0 Brick  1 x  3
// 0 Name: 3622.dat
// 0 Author: James Jessiman
// 0 !LDRAW_ORG Part UPDATE 2004-02
// 0 !LICENSE Licensed under CC BY 2.0 and CC BY 4.0 : see CAreadme.txt
// 
// 0 BFC CERTIFY CCW
  [0,"BFC","CERTIFY"],
  [0,"BFC","CCW"],
// 
// 0 !HISTORY 2003-10-15 [westrate] Subfiled, BFC'd
// 0 !HISTORY 2004-04-22 [PTadmin] Official Update 2004-02
// 0 !HISTORY 2007-06-25 [PTadmin] Header formatted for Contributor Agreement
// 0 !HISTORY 2008-07-01 [PTadmin] Official Update 2008-01
// 
// 
// 1 16 0 0 0 1 0 0 0 1 0 0 0 1 s\3622s01.dat
  [1,16,0,0,0,1,0,0,0,1,0,0,0,1, ldraw_lib__s__3622s01()],
// 4 16 30 0 -10 -30 0 -10 -30 24 -10 30 24 -10
  [4,16,30,0,-10,-30,0,-10,-30,24,-10,30,24,-10],
// 0
];
makepoly(ldraw_lib__3622(), line=0.2);
// file: 195555b.scad
use <../lib.scad>
use <../p/box5-12.scad>
use <../p/logo-shell-1971-outerbox.scad>
use <../p/logo-shell-1971.scad>
function ldraw_lib__195555b() = [
// 0 Sticker  1.0 x  1.3 with Shell Logo 1971 on White Background
// 0 Name: 195555b.dat
// 0 Author: Takeshi Takahashi [RainbowDolphin]
// 0 !LDRAW_ORG Part UPDATE 2026-01
// 0 !LICENSE Licensed under CC BY 4.0 : see CAreadme.txt
// 
// 0 BFC CERTIFY CCW
  [0,"BFC","CERTIFY"],
  [0,"BFC","CCW"],
// 
// 0 !KEYWORDS Bricklink 6371stk01, Brickowl 584391, Rebrickable 195555
// 0 !KEYWORDS Service station, Set 6371
// 
// 0 !HISTORY 2023-06-29 [RainbowDolphin] Colour variant of 196945x by Vincent Messenet [Cheenzo]
// 0 !HISTORY 2023-08-25 [OrionP] Official Update 2023-04
// 0 !HISTORY 2026-01-23 [MagFors] Update description
// 0 !HISTORY 2026-01-29 [OrionP] Official Update 2026-01
// 
// 1 16 0 -.25 0 13 0 0 0 .25 0 0 0 10 box5-12.dat
  [1,16,0,-.25,0,13,0,0,0,.25,0,0,0,10, ldraw_lib__box5_12()],
// 4 15 -7.36 -.25 -1.5296 -7.36 -.25 6.72 -13 -.25 10 -13 -.25 -10
  [4,15,-7.36,-.25,-1.5296,-7.36,-.25,6.72,-13,-.25,10,-13,-.25,-10],
// 3 15 -7.36 -.25 -1.5296 -13 -.25 -10 -7.36 -.25 -6.72
  [3,15,-7.36,-.25,-1.5296,-13,-.25,-10,-7.36,-.25,-6.72],
// 4 15 0 -.25 -6.72 -7.36 -.25 -6.72 -13 -.25 -10 13 -.25 -10
  [4,15,0,-.25,-6.72,-7.36,-.25,-6.72,-13,-.25,-10,13,-.25,-10],
// 3 15 7.36 -.25 -6.72 0 -.25 -6.72 13 -.25 -10
  [3,15,7.36,-.25,-6.72,0,-.25,-6.72,13,-.25,-10],
// 4 15 7.36 -.25 -1.5296 7.36 -.25 -6.72 13 -.25 -10 13 -.25 10
  [4,15,7.36,-.25,-1.5296,7.36,-.25,-6.72,13,-.25,-10,13,-.25,10],
// 3 15 13 -.25 10 7.36 -.25 6.72 7.36 -.25 -1.5296
  [3,15,13,-.25,10,7.36,-.25,6.72,7.36,-.25,-1.5296],
// 4 15 0 -.25 6.72 7.36 -.25 6.72 13 -.25 10 -13 -.25 10
  [4,15,0,-.25,6.72,7.36,-.25,6.72,13,-.25,10,-13,-.25,10],
// 3 15 -13 -.25 10 -7.36 -.25 6.72 0 -.25 6.72
  [3,15,-13,-.25,10,-7.36,-.25,6.72,0,-.25,6.72],
// 1 15 0 -.25 0 .64 0 0 0 1 0 0 0 .64 logo-shell-1971-outerbox.dat
  [1,15,0,-.25,0,.64,0,0,0,1,0,0,0,.64, ldraw_lib__logo_shell_1971_outerbox()],
// 1 16 0 -.25 0 .64 0 0 0 1 0 0 0 .64 logo-shell-1971.dat
  [1,16,0,-.25,0,.64,0,0,0,1,0,0,0,.64, ldraw_lib__logo_shell_1971()],
];
module ldraw_lib__195555b(step=0, col=false, unit=2/5, alt=false, line=0.2, solid=!$preview)
    makepoly(ldraw_lib__195555b(), step=step, col=col, unit=unit, alt=alt, line=line, solid=solid);
ldraw_lib__195555b(line=0.2);
// main file
use <../lib.scad>
use <195555b.scad>
use <3622.scad>
function ldraw_lib__3622d01() = [
// 0 Brick  1 x  3 with Shell Logo 1971 Left Sticker
// 0 Name: 3622d01.dat
// 0 Author: Takeshi Takahashi [RainbowDolphin]
// 0 !LDRAW_ORG Shortcut UPDATE 2024-07
// 0 !LICENSE Licensed under CC BY 4.0 : see CAreadme.txt
// 
// 0 BFC CERTIFY CCW
  [0,"BFC","CERTIFY"],
  [0,"BFC","CCW"],
// 
// 0 !CATEGORY Sticker Shortcut
// 0 !KEYWORDS Bricklink 3622pb044L, Service station, Set 6371, Tow Truck
// 
// 0 !HISTORY 2024-08-26 [OrionP] Official Update 2024-07
// 
// 1 16 0 0 0 1 0 0 0 1 0 0 0 1 3622.dat
  [1,16,0,0,0,1,0,0,0,1,0,0,0,1, ldraw_lib__3622()],
// 1 16 -10 12 -10 1 0 0 0 0 -1 0 1 0 195555b.dat
  [1,16,-10,12,-10,1,0,0,0,0,-1,0,1,0, ldraw_lib__195555b()],
];
module ldraw_lib__3622d01(step=0, col=false, unit=2/5, alt=false, line=0.2, solid=!$preview)
    makepoly(ldraw_lib__3622d01(), step=step, col=col, unit=unit, alt=alt, line=line, solid=solid);
ldraw_lib__3622d01(line=0.2);
